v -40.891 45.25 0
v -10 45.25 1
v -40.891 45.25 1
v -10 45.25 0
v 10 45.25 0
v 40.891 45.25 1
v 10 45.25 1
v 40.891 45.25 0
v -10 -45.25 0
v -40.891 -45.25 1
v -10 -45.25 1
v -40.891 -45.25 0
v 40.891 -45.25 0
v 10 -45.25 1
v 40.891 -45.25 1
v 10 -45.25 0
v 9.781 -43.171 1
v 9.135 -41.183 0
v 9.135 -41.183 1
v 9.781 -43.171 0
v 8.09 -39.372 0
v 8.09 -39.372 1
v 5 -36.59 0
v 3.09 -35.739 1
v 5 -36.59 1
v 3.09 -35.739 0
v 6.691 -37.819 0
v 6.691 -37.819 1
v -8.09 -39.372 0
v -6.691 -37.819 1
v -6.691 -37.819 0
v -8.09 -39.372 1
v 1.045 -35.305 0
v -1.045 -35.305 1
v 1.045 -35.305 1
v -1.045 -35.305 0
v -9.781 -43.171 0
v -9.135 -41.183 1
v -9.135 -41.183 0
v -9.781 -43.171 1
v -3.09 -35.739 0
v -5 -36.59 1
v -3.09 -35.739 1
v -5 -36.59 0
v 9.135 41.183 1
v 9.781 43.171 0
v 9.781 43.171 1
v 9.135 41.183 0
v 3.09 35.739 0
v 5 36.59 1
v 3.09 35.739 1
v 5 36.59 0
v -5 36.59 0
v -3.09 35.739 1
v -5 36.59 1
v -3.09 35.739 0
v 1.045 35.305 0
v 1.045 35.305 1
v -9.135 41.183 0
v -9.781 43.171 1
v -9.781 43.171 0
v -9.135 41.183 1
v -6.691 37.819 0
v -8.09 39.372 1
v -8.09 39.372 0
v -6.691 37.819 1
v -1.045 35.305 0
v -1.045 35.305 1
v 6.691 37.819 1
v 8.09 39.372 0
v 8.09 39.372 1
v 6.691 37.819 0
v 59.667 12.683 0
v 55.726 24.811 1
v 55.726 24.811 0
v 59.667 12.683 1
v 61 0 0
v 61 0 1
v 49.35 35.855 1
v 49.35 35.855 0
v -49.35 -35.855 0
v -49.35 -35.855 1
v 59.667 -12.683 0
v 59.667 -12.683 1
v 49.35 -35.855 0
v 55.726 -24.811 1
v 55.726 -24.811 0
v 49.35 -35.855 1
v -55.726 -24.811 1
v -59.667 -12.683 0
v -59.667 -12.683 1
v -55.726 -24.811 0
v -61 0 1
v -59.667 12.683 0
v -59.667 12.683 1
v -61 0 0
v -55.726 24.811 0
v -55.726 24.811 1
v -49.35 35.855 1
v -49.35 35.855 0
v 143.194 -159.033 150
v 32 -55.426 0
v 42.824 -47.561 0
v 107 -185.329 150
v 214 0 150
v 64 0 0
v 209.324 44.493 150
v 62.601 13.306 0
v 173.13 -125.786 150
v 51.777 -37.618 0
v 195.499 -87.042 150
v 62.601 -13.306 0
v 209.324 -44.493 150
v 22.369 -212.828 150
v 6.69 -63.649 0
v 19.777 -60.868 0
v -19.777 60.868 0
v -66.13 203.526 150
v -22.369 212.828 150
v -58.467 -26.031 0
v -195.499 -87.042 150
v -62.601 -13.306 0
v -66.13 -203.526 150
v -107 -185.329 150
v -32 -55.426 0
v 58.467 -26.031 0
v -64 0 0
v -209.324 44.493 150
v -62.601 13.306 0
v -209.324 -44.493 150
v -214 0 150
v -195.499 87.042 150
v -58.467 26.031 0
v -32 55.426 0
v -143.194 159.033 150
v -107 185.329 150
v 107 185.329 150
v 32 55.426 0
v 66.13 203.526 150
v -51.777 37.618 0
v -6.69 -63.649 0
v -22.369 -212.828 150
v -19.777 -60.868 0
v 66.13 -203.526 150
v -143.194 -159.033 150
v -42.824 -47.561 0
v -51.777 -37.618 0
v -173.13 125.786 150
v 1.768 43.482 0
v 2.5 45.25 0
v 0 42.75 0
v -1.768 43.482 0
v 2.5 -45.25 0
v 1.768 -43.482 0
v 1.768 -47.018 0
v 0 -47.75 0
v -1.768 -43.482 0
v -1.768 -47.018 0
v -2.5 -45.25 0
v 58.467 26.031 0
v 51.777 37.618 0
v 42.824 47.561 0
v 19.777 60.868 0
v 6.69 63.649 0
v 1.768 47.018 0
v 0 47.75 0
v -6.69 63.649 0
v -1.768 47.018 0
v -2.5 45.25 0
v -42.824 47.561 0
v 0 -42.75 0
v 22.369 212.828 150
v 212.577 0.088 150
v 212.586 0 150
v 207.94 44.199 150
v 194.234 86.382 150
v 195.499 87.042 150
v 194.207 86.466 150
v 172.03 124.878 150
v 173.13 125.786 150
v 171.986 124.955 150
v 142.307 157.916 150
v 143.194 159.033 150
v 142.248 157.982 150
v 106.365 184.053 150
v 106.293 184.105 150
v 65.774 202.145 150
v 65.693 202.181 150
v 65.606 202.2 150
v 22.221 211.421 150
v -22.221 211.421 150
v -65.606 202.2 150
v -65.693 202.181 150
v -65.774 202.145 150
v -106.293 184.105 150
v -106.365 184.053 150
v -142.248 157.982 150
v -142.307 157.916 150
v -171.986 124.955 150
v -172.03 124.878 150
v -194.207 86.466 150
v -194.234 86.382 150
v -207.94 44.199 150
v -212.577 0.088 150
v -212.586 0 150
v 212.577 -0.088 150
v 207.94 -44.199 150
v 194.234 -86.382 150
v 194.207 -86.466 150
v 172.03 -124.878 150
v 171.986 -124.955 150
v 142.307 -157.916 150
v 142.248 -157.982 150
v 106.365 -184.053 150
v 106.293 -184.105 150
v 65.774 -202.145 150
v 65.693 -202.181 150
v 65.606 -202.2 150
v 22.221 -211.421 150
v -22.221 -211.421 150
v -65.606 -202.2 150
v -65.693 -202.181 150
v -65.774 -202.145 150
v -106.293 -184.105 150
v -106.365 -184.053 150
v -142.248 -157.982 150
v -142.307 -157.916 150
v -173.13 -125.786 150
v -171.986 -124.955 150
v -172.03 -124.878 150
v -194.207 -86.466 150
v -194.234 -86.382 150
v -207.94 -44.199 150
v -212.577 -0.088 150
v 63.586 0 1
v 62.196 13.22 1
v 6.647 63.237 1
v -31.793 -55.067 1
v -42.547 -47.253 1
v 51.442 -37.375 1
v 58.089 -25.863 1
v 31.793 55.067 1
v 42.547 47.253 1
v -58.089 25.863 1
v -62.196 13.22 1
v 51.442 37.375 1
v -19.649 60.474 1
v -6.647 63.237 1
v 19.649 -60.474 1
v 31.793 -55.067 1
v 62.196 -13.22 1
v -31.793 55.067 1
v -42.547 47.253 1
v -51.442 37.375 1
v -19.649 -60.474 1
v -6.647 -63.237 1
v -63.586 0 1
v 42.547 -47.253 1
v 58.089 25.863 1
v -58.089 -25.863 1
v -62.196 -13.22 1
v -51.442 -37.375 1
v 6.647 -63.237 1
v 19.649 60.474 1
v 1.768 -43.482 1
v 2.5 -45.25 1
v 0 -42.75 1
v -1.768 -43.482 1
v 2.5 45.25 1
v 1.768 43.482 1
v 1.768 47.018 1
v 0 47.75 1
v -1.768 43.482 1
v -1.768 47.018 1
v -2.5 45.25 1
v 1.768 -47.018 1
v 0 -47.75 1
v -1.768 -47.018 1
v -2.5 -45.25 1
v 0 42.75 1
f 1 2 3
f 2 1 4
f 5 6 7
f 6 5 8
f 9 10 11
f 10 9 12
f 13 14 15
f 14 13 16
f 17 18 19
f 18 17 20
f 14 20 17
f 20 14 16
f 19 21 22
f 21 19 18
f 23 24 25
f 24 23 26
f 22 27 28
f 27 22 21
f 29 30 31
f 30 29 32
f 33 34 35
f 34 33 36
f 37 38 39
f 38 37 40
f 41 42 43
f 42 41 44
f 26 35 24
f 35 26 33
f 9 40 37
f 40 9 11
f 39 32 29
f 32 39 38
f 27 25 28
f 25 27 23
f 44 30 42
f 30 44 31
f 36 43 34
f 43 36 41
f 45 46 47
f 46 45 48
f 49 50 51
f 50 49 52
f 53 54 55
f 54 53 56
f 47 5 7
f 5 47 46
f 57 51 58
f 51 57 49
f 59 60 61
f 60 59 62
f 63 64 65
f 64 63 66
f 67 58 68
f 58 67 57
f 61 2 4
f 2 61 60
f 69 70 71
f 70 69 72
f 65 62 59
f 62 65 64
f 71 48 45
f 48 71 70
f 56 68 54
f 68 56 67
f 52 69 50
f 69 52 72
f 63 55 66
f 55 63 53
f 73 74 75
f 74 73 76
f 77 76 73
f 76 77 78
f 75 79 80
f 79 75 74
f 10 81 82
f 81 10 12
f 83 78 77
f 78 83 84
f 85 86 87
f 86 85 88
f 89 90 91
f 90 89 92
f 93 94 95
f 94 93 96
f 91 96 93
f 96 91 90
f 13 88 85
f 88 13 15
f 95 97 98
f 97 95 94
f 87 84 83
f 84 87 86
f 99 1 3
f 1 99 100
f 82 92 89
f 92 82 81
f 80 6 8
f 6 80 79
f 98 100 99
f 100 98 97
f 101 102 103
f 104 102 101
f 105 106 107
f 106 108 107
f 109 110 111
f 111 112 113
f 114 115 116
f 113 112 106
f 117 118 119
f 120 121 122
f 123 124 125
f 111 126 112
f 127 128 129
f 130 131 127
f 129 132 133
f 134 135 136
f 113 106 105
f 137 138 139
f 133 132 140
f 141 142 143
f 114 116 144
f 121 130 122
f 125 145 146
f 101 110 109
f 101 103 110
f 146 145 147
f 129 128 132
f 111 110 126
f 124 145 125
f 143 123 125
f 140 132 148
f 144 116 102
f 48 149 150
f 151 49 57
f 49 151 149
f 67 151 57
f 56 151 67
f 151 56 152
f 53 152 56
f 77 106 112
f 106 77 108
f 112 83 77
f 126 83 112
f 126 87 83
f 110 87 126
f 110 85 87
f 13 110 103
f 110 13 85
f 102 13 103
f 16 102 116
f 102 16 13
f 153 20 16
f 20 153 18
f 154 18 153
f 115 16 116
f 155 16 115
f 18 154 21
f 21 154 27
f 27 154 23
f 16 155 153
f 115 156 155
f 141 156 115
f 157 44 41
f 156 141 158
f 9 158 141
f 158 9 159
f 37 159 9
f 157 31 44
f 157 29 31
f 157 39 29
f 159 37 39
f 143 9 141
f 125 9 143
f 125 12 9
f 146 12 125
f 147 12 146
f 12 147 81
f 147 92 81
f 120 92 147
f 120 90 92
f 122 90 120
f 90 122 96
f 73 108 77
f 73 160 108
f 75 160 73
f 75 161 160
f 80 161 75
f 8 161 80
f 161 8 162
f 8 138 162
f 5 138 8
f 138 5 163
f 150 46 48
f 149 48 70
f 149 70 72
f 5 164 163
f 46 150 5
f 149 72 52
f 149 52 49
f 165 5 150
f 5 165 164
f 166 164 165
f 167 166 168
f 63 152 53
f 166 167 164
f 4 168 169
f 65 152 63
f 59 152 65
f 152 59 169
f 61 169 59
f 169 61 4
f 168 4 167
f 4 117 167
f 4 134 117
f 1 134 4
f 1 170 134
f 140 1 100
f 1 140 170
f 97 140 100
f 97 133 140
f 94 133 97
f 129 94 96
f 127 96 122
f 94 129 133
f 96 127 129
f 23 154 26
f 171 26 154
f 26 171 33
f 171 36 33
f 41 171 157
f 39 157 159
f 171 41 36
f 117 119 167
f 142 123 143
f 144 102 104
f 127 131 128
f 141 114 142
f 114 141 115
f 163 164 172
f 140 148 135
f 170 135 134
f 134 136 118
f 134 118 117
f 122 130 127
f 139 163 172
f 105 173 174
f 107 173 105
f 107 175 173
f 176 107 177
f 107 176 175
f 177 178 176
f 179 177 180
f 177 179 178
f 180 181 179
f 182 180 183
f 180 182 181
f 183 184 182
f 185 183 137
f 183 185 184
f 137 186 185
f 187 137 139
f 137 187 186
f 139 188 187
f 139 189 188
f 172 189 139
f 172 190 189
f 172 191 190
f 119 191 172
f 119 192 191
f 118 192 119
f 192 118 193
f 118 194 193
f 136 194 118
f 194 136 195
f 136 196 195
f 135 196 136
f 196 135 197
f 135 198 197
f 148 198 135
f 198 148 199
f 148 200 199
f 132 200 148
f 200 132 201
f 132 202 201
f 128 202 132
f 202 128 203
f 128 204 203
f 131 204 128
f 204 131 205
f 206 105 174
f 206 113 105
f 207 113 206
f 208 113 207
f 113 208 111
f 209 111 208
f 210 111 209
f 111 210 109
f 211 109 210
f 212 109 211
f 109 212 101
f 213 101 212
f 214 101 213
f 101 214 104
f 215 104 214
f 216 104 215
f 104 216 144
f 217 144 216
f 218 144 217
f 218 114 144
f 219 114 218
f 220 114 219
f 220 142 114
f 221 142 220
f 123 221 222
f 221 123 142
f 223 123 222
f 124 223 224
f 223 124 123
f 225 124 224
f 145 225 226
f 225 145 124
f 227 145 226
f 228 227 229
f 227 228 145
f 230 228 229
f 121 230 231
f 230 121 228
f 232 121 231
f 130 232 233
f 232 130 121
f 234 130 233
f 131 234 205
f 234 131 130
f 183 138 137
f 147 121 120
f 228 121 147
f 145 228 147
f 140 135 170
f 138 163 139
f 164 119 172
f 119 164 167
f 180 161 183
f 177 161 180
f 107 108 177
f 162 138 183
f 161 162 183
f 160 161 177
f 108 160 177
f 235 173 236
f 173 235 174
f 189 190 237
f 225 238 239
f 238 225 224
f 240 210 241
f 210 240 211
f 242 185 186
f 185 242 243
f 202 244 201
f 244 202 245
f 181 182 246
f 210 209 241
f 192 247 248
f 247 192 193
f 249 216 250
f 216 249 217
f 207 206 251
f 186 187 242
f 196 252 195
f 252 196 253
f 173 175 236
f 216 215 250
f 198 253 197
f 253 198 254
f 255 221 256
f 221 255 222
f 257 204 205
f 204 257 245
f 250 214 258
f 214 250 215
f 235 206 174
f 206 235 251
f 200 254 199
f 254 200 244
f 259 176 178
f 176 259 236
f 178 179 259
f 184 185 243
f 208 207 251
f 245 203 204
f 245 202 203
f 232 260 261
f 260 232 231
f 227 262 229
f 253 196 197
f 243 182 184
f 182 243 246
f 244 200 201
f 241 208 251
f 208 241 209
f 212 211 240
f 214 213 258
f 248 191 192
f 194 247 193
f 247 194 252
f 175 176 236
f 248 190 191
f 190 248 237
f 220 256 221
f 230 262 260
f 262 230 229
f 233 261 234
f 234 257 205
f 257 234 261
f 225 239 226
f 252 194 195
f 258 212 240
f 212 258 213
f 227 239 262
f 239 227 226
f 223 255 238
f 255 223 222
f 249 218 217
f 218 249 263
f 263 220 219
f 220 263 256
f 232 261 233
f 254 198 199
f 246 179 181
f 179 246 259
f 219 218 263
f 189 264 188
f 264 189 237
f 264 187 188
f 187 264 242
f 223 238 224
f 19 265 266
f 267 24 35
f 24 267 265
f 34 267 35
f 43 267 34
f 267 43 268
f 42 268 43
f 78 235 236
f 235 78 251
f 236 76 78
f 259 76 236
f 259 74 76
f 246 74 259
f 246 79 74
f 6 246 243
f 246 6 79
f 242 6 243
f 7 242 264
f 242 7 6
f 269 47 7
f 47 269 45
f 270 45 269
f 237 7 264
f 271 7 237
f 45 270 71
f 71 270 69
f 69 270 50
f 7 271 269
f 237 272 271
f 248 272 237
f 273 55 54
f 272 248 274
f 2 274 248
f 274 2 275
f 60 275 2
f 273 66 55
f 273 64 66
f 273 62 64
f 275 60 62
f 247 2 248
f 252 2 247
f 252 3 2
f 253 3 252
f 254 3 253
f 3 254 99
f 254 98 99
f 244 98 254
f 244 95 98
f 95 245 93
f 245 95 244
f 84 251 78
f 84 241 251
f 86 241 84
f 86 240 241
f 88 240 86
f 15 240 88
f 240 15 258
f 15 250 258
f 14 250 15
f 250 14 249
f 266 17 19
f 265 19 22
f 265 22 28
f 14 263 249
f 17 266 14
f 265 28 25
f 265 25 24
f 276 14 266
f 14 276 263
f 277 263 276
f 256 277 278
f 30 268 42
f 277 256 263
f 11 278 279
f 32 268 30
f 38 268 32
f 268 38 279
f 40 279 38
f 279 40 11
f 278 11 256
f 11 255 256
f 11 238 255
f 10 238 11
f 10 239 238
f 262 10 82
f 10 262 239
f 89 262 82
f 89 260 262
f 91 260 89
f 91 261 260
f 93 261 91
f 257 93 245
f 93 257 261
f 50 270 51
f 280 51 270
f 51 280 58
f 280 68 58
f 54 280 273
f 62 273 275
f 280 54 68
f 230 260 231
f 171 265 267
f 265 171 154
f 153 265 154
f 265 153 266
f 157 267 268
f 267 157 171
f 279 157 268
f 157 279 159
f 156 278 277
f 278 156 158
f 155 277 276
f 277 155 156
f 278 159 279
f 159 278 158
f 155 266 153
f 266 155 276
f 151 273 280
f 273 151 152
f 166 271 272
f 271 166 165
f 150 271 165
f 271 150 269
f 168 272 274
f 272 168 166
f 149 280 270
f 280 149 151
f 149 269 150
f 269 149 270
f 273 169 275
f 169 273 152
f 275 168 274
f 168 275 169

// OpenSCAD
// A replacement shade for a torchiere

wall_thickness = 1;
floor_thickness = wall_thickness;
fastener_spacing = 90.5;
fastener_diameter = 5;
fastener_ring = 20;
ring_inner_diameter = 122;
ring_outer_diameter = 128;
height = 150;
overcut = 1;

difference() {
    cylinder(h = height, r1 = ring_outer_diameter/2, r2 = ring_outer_diameter/2 + height);
    translate([0,0,floor_thickness])
    cylinder(h = height, r1 = ring_outer_diameter/2 - wall_thickness*sqrt(2) + floor_thickness,
        r2 = ring_outer_diameter/2 + height - wall_thickness*sqrt(2) + floor_thickness);
    translate([0,0,-overcut])
        intersection() {
            cylinder(h = floor_thickness + 2*overcut, r = ring_inner_diameter/2);
            difference() {
                translate([-ring_inner_diameter/2,-fastener_spacing/2,-overcut])
                    cube([ring_inner_diameter,fastener_spacing,
                        floor_thickness + 4*overcut]);
                translate([0, -fastener_spacing/2, -overcut*2])
                    cylinder(r=fastener_ring/2, h=floor_thickness + 8*overcut);
                translate([0, fastener_spacing/2, -overcut*2])
                    cylinder(r=fastener_ring/2, h=floor_thickness + 8*overcut);
            }
        }
    translate([0, -fastener_spacing/2, -overcut])
        cylinder(r=fastener_diameter/2, h=floor_thickness + 2*overcut);
    translate([0, fastener_spacing/2, -overcut])
        cylinder(r=fastener_diameter/2, h=floor_thickness + 2*overcut);
    //translate([0,0,-10]) cube([1000,1000,1000]);
}
